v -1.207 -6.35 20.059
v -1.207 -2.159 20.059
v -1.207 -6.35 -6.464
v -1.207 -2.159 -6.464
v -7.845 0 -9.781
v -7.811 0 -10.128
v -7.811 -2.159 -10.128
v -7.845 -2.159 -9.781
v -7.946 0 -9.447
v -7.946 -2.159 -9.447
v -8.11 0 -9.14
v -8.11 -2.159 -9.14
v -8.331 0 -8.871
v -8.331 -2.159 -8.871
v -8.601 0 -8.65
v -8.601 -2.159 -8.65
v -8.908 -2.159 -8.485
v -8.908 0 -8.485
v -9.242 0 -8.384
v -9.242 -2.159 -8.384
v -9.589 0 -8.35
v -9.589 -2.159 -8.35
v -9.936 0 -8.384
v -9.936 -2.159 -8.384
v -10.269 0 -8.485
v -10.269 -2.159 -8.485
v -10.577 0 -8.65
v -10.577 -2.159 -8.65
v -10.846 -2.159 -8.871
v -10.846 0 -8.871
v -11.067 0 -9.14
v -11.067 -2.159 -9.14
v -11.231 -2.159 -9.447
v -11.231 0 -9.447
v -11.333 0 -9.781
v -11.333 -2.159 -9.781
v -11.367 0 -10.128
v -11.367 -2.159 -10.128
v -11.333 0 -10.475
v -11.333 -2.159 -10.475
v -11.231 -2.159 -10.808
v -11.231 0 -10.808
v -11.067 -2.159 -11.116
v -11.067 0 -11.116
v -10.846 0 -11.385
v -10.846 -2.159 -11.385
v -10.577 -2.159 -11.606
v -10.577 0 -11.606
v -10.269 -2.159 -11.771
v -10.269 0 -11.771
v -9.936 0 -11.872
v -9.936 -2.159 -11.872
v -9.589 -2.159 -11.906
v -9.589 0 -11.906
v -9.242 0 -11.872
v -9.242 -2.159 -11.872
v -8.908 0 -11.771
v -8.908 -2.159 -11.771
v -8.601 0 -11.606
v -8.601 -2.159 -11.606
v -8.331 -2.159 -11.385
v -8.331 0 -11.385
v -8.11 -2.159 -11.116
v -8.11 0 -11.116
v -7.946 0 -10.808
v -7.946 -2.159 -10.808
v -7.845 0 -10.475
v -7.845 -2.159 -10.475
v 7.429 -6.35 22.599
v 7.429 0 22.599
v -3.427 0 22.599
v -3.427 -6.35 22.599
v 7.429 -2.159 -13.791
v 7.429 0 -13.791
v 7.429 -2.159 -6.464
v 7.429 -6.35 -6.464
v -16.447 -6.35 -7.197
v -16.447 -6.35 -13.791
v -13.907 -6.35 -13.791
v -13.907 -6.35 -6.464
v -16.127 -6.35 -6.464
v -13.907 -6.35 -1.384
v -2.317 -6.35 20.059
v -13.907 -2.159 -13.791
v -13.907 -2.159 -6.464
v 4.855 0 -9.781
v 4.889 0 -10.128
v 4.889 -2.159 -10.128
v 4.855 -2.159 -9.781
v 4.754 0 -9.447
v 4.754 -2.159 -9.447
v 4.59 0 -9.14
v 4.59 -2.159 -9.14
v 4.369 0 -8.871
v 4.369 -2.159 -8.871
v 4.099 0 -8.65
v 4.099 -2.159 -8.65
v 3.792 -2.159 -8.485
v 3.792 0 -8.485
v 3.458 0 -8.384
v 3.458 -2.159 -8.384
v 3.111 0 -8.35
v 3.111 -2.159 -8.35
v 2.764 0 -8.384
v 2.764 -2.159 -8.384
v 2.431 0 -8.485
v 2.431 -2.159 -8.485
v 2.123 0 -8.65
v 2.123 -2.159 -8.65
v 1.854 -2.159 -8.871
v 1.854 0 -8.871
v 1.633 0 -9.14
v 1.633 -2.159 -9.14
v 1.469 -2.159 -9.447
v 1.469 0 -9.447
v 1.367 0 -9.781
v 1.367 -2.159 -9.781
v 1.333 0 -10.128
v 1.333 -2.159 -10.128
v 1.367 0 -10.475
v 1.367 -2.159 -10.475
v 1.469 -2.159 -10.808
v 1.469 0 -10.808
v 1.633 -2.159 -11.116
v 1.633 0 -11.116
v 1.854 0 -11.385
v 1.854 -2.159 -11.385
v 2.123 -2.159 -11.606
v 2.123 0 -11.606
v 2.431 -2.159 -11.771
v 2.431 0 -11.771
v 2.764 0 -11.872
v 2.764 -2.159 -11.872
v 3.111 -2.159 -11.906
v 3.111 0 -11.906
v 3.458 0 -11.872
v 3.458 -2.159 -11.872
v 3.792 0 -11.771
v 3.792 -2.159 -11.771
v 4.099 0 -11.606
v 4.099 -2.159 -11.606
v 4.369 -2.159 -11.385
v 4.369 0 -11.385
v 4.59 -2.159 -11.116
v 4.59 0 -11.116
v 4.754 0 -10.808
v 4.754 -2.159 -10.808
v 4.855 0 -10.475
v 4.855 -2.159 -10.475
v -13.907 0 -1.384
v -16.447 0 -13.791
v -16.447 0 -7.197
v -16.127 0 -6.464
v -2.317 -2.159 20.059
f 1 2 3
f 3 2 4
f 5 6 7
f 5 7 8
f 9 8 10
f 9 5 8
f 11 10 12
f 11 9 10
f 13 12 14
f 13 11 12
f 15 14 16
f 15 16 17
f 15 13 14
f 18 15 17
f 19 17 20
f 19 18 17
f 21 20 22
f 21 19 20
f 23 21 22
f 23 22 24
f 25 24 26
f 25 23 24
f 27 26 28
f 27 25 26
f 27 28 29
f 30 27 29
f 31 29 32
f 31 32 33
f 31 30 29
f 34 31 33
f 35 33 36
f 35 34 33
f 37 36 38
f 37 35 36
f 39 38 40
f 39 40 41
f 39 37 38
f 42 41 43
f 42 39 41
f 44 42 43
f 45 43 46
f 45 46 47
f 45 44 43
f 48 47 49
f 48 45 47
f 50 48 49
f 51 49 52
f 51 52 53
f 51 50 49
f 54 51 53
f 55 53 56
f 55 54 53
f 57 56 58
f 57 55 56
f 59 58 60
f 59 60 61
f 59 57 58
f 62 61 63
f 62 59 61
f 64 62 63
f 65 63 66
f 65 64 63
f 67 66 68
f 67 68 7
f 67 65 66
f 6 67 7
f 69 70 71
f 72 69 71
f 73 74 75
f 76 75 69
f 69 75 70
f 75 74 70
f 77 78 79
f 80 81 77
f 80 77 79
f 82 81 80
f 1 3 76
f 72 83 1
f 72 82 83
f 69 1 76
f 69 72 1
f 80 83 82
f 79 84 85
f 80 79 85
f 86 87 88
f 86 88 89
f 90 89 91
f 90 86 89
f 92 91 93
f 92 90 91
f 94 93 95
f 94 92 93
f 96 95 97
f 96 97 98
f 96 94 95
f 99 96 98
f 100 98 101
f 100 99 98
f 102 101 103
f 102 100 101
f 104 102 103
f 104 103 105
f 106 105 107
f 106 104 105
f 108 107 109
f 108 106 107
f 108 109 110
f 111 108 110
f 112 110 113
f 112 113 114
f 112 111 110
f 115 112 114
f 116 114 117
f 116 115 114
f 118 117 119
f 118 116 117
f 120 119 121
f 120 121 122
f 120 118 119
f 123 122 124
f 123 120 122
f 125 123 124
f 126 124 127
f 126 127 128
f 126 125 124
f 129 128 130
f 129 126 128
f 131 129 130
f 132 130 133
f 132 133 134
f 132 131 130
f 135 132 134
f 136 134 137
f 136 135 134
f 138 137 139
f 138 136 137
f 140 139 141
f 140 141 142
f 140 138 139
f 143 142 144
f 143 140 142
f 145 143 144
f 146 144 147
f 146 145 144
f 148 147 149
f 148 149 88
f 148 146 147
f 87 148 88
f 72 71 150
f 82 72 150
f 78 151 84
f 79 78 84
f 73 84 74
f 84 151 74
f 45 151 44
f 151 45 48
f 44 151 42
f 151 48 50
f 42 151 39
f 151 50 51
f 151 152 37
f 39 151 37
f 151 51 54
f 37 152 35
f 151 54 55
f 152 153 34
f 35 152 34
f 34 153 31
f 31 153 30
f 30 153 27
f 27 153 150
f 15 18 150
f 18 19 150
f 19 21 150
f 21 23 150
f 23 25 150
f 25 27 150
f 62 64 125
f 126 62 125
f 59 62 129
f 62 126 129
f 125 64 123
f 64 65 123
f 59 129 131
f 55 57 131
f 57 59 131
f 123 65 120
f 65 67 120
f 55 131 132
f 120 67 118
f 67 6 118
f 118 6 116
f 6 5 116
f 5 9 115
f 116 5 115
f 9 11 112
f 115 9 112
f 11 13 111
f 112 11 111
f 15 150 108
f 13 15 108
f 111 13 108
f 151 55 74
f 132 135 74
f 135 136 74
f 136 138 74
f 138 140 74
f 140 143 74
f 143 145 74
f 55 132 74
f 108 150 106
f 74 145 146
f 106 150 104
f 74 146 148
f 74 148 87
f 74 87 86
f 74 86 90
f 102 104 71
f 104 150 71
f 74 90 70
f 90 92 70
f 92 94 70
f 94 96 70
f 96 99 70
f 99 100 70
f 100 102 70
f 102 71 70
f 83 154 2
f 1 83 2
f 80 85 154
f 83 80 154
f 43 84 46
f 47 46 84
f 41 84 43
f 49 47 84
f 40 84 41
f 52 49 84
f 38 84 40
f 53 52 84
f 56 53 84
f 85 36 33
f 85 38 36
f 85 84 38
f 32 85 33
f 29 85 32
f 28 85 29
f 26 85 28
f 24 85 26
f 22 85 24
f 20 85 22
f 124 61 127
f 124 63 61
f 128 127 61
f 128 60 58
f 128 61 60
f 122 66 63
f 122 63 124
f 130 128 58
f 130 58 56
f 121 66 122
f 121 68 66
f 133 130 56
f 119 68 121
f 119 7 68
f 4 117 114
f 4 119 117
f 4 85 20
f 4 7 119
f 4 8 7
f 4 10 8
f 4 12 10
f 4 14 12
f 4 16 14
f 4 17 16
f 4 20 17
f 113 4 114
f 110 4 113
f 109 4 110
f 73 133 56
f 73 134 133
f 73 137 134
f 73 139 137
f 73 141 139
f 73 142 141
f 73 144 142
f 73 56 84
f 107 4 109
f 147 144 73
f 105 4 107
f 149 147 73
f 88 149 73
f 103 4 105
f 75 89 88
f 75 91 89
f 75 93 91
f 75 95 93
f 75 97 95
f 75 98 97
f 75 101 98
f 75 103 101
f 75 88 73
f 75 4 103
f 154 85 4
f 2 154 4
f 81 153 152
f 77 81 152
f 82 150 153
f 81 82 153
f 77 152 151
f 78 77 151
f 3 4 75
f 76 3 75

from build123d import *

# Parameters (mm, degrees)
F0_R     = 1.778
F1_DEPTH = 2.159
F2_DEPTH = 6.35


with BuildPart() as f1:
    # F0 (on Front) → F1 (new body)
    with BuildSketch(Plane.XZ):
        Polygon((-13.906726, -6.464459), (-13.906726, -13.791269), (7.429274, -13.791269), (7.429274, -6.464459), (-1.206726, -6.464459), align=None)
        with Locations((-9.588726, -10.127864)):
            Circle(F0_R, mode=Mode.SUBTRACT)
        with Locations((3.111274, -10.127864)):
            Circle(F0_R, mode=Mode.SUBTRACT)
        Polygon((-16.446726, -13.791269), (-13.906726, -13.791269), (-13.906726, -6.464459), (-16.126592, -6.464459), (-16.446726, -7.197061), align=None)
        Polygon((-16.126592, -6.464459), (-13.906726, -6.464459), (-2.316659, 20.058554), (-1.206726, 20.058554), (-1.206726, -6.464459), (7.429274, -6.464459), (7.429274, 22.598554), (-1.206726, 22.598554), (-3.426592, 22.598554), (-13.906726, -1.384459), align=None)
        Polygon((-2.316659, 20.058554), (-13.906726, -6.464459), (-1.206726, -6.464459), (-1.206726, 20.058554), align=None)
    extrude(amount=F1_DEPTH)

    # F0 (on Front) → F2 (join)
    with BuildSketch(Plane.XZ):
        Polygon((-16.126592, -6.464459), (-13.906726, -6.464459), (-2.316659, 20.058554), (-1.206726, 20.058554), (-1.206726, -6.464459), (7.429274, -6.464459), (7.429274, 22.598554), (-1.206726, 22.598554), (-3.426592, 22.598554), (-13.906726, -1.384459), align=None)
        Polygon((-16.446726, -13.791269), (-13.906726, -13.791269), (-13.906726, -6.464459), (-16.126592, -6.464459), (-16.446726, -7.197061), align=None)
    extrude(amount=F2_DEPTH)


solid = f1.part
